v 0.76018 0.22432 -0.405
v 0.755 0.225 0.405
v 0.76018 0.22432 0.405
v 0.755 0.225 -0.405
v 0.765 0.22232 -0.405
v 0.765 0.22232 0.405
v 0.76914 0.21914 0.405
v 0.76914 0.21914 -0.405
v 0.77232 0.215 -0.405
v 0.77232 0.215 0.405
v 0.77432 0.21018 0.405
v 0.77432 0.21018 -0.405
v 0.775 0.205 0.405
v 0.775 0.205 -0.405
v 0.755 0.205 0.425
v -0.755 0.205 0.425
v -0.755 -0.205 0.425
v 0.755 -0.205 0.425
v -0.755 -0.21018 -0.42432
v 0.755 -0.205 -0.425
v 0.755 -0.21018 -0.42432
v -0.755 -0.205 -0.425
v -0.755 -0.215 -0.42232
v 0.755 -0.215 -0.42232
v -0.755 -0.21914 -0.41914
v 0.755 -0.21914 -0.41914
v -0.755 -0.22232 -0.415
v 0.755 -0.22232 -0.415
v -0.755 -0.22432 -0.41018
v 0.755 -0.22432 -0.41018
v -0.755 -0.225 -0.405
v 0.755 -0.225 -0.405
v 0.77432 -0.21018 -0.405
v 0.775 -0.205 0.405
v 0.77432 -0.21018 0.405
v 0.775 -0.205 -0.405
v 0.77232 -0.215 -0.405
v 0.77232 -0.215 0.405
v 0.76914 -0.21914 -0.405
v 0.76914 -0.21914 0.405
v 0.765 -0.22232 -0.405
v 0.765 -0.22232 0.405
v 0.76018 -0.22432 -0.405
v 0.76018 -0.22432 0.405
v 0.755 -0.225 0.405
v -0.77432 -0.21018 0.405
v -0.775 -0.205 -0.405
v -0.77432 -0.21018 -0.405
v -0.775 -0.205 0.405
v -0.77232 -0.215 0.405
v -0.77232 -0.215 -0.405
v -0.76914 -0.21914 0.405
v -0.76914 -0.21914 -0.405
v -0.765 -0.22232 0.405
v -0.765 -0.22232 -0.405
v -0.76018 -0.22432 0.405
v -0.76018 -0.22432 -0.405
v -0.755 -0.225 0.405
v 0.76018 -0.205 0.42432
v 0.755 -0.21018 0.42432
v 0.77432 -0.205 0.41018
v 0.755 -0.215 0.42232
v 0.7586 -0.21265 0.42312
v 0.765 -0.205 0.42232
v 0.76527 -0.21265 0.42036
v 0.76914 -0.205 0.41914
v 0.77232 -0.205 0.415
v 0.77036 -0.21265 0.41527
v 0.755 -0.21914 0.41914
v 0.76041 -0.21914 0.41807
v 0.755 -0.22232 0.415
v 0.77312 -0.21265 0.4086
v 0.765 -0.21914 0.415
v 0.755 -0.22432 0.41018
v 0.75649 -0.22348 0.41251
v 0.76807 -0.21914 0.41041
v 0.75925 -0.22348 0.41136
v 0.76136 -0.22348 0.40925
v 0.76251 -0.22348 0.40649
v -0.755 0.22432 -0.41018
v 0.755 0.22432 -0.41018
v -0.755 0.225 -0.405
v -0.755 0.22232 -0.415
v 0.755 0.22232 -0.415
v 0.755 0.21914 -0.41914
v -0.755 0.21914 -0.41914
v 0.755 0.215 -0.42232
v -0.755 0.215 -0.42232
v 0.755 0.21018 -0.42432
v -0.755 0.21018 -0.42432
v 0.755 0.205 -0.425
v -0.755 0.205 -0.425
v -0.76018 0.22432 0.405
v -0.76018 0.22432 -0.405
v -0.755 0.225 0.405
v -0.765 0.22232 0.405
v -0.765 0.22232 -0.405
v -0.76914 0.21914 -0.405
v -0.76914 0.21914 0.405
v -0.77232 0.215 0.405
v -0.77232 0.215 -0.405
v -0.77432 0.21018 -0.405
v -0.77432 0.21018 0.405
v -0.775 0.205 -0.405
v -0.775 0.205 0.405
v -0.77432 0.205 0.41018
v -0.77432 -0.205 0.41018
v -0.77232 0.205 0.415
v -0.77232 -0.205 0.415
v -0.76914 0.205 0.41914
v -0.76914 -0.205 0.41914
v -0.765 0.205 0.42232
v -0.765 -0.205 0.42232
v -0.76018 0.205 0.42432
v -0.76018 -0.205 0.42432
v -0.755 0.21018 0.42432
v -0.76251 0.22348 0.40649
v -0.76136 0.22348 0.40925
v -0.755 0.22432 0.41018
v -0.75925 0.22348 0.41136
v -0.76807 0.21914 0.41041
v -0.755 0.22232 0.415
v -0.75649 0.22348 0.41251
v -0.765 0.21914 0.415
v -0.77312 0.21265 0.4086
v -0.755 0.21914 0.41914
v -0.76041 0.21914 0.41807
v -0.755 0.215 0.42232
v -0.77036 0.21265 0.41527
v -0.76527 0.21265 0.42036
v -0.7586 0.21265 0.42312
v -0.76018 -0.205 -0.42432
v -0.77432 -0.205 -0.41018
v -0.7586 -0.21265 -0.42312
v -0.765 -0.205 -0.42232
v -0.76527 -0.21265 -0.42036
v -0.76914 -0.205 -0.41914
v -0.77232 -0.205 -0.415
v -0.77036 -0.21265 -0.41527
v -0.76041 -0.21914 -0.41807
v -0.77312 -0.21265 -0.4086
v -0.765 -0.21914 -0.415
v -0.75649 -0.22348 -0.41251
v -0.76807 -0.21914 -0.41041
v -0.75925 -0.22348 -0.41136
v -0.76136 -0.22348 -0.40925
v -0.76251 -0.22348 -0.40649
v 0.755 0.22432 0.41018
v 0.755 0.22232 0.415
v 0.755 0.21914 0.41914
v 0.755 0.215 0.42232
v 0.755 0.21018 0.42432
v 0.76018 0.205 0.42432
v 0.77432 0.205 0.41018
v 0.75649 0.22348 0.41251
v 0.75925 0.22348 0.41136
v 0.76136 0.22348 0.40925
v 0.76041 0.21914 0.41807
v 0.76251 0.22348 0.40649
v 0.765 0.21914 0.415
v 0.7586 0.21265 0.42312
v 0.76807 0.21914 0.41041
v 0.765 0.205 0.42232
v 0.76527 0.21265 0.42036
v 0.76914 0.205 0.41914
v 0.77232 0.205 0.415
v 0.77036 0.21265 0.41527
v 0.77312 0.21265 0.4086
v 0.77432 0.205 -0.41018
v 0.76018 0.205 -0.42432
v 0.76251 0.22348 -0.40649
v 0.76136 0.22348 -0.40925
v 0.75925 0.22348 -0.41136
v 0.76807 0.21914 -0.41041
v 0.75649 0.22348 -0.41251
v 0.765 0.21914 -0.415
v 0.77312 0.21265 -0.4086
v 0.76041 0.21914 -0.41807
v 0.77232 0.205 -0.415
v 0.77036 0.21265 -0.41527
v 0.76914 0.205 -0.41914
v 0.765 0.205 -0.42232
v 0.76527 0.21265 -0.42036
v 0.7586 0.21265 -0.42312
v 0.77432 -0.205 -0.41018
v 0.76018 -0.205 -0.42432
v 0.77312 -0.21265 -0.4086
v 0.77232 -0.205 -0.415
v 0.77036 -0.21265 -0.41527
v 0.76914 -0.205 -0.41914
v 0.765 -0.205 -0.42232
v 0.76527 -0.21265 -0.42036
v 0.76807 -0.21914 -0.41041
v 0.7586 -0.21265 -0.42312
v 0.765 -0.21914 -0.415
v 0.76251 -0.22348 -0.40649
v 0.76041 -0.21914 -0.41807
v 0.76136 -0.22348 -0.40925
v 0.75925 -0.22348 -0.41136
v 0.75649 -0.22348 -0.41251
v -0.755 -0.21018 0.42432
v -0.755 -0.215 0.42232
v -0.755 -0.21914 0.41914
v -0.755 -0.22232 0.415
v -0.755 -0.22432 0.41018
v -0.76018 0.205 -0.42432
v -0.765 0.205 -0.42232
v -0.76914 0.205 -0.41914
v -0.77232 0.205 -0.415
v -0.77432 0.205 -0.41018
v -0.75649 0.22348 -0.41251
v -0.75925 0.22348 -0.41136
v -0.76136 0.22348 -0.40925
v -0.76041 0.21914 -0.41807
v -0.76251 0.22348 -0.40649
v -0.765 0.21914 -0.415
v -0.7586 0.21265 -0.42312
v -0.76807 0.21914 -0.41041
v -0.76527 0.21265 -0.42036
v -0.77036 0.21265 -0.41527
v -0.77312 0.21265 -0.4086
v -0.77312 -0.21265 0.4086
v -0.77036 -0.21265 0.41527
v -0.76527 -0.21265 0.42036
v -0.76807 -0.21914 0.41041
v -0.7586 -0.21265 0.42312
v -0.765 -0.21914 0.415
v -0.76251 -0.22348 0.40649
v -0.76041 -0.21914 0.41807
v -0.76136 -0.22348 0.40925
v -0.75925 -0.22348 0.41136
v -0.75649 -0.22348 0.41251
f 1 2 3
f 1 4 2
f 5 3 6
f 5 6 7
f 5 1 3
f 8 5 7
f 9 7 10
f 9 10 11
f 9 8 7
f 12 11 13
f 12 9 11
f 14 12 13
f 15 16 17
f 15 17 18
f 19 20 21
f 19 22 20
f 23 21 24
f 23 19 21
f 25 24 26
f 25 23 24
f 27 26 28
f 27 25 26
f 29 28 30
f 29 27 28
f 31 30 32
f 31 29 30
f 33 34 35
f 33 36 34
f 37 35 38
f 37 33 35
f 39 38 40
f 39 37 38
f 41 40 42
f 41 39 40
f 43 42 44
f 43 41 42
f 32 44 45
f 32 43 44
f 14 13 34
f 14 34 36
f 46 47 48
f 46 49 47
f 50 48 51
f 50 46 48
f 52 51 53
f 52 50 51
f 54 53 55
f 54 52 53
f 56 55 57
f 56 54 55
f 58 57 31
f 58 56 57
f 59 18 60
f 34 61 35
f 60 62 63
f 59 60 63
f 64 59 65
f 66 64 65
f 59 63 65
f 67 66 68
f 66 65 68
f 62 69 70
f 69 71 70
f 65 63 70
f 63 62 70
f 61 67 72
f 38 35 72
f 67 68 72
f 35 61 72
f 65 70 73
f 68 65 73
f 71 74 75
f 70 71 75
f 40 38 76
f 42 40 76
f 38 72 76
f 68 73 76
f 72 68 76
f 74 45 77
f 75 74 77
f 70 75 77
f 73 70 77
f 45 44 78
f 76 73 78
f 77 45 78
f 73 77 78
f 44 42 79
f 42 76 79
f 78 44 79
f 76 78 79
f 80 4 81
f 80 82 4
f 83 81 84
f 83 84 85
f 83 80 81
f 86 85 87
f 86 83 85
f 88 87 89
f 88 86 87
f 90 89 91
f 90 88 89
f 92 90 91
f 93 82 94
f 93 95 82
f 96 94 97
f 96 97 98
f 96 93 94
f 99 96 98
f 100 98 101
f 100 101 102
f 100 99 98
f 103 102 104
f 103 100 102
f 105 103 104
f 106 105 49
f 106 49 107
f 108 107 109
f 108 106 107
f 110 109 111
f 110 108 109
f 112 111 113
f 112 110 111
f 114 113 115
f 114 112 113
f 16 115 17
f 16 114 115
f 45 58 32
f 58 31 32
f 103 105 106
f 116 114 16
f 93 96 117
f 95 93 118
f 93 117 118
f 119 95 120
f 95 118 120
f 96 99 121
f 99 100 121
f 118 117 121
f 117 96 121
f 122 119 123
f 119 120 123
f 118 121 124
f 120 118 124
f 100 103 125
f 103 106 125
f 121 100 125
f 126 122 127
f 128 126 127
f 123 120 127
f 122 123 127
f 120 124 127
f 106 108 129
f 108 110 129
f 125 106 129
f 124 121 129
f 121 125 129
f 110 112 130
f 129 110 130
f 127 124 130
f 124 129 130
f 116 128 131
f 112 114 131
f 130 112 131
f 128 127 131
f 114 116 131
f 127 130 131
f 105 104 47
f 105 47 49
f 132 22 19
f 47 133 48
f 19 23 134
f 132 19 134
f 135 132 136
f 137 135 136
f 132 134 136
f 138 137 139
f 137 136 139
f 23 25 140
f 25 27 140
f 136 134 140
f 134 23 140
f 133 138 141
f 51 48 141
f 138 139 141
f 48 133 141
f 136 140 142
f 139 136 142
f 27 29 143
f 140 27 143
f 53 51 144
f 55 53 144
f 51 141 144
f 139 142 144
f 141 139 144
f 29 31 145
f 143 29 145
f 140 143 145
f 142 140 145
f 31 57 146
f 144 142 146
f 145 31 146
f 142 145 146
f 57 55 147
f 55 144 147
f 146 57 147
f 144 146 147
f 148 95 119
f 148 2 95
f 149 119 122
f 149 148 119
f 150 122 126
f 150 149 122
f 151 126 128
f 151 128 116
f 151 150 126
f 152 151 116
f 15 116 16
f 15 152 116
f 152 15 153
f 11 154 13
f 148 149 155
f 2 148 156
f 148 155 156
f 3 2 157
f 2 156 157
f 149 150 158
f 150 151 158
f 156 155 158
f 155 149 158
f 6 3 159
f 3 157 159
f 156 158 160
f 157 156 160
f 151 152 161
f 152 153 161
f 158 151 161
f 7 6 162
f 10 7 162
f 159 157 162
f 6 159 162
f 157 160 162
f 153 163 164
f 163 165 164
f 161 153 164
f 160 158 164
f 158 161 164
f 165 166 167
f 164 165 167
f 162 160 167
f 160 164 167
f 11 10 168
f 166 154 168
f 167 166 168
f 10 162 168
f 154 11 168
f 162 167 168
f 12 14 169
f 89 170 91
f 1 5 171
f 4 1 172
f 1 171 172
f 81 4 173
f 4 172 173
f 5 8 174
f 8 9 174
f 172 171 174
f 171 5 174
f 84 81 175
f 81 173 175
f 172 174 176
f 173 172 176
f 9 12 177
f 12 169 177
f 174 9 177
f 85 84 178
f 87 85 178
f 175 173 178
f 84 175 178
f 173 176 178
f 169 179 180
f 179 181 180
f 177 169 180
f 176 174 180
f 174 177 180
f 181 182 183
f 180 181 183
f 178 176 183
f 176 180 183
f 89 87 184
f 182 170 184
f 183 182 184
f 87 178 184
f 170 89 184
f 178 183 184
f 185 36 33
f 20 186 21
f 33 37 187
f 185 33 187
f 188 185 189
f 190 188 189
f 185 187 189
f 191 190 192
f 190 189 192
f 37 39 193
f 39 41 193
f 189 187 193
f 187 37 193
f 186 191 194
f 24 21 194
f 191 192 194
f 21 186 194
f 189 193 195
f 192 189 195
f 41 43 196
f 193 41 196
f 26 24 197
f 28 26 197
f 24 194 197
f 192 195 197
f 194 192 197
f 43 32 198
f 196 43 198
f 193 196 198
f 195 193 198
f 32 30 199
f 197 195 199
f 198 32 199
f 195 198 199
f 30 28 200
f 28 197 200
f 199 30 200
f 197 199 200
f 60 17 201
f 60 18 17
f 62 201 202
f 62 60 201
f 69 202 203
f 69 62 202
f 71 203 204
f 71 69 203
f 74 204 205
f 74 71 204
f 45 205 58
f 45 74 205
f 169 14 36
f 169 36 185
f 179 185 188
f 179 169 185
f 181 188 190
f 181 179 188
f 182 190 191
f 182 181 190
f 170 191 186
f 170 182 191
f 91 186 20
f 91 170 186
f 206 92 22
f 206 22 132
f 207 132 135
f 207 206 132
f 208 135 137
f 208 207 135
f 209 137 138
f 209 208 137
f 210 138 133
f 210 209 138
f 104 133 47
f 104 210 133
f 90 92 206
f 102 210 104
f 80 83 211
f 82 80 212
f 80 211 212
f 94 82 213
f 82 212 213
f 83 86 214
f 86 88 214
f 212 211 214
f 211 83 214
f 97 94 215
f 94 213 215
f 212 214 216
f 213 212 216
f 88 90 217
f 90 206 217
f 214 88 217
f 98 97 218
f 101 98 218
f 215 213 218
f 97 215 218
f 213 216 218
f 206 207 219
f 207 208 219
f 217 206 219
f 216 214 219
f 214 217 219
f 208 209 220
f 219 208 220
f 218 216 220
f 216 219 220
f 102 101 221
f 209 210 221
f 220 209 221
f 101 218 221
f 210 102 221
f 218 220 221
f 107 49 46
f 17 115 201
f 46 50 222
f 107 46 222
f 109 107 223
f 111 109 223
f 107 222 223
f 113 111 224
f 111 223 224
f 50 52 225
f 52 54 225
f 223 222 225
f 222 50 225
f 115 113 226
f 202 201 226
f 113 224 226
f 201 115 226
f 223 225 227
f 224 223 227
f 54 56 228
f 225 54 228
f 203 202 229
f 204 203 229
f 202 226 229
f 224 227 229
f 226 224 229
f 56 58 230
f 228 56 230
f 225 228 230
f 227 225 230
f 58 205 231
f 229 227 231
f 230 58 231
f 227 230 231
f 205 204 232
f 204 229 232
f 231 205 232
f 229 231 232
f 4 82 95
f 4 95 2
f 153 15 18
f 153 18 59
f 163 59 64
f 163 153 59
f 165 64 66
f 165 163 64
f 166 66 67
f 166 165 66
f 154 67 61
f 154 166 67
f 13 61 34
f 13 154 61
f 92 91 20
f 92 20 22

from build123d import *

# Parameters (mm, degrees)
BOSS_EXTRUDE1_DEPTH = 0.225
FILLET2_R           = 0.02


with BuildPart() as part:
    # Sketch1 → Boss-Extrude1 (new, symmetric)
    with BuildSketch(Plane(origin=(0, 0, 0), x_dir=(1, 0, 0), z_dir=(0, 1, 0))):
        with BuildLine():
            Line((-0.755, -0.425), (0.755, -0.425))
            ThreePointArc((0.755, -0.425), (0.769142136, -0.419142136), (0.775, -0.405))
            Line((0.775, -0.405), (0.775, 0.405))
            ThreePointArc((0.775, 0.405), (0.769142136, 0.419142136), (0.755, 0.425))
            Line((0.755, 0.425), (-0.755, 0.425))
            ThreePointArc((-0.755, 0.425), (-0.769142136, 0.419142136), (-0.775, 0.405))
            Line((-0.775, 0.405), (-0.775, -0.405))
            ThreePointArc((-0.775, -0.405), (-0.769142136, -0.419142136), (-0.755, -0.425))
        make_face()
    extrude(amount=BOSS_EXTRUDE1_DEPTH, both=True)

    # Fillet2
    fillet2_edges = [part.edges().sort_by_distance(p)[0] for p in [
        (0.769142136, 0.225, 0.419142136),
        (0, -0.225, 0.425),
        (0, 0.225, 0.425),
        (0, 0.225, -0.425),
        (-0.769142136, -0.225, 0.419142136),
        (0, 0.225, -0.425),
        (0, 0.225, 0.425),
        (0, -0.225, 0.425),
        (0.775, 0.225, 0),
        (0, -0.225, 0.425),
        (0, -0.225, -0.425),
        (0, -0.225, -0.425),
        (0.769142136, 0.225, -0.419142136),
        (0, 0.225, -0.425),
        (-0.769142136, 0.225, -0.419142136),
        (-0.775, 0.225, 0),
        (-0.769142136, 0.225, 0.419142136),
        (0, 0.225, 0.425),
        (-0.775, -0.225, 0),
        (-0.769142136, -0.225, -0.419142136),
        (0, -0.225, -0.425),
        (0.769142136, -0.225, -0.419142136),
        (0.775, -0.225, 0),
        (0.769142136, -0.225, 0.419142136),
    ]]
    fillet(fillet2_edges, radius=FILLET2_R)


solid = part.part
